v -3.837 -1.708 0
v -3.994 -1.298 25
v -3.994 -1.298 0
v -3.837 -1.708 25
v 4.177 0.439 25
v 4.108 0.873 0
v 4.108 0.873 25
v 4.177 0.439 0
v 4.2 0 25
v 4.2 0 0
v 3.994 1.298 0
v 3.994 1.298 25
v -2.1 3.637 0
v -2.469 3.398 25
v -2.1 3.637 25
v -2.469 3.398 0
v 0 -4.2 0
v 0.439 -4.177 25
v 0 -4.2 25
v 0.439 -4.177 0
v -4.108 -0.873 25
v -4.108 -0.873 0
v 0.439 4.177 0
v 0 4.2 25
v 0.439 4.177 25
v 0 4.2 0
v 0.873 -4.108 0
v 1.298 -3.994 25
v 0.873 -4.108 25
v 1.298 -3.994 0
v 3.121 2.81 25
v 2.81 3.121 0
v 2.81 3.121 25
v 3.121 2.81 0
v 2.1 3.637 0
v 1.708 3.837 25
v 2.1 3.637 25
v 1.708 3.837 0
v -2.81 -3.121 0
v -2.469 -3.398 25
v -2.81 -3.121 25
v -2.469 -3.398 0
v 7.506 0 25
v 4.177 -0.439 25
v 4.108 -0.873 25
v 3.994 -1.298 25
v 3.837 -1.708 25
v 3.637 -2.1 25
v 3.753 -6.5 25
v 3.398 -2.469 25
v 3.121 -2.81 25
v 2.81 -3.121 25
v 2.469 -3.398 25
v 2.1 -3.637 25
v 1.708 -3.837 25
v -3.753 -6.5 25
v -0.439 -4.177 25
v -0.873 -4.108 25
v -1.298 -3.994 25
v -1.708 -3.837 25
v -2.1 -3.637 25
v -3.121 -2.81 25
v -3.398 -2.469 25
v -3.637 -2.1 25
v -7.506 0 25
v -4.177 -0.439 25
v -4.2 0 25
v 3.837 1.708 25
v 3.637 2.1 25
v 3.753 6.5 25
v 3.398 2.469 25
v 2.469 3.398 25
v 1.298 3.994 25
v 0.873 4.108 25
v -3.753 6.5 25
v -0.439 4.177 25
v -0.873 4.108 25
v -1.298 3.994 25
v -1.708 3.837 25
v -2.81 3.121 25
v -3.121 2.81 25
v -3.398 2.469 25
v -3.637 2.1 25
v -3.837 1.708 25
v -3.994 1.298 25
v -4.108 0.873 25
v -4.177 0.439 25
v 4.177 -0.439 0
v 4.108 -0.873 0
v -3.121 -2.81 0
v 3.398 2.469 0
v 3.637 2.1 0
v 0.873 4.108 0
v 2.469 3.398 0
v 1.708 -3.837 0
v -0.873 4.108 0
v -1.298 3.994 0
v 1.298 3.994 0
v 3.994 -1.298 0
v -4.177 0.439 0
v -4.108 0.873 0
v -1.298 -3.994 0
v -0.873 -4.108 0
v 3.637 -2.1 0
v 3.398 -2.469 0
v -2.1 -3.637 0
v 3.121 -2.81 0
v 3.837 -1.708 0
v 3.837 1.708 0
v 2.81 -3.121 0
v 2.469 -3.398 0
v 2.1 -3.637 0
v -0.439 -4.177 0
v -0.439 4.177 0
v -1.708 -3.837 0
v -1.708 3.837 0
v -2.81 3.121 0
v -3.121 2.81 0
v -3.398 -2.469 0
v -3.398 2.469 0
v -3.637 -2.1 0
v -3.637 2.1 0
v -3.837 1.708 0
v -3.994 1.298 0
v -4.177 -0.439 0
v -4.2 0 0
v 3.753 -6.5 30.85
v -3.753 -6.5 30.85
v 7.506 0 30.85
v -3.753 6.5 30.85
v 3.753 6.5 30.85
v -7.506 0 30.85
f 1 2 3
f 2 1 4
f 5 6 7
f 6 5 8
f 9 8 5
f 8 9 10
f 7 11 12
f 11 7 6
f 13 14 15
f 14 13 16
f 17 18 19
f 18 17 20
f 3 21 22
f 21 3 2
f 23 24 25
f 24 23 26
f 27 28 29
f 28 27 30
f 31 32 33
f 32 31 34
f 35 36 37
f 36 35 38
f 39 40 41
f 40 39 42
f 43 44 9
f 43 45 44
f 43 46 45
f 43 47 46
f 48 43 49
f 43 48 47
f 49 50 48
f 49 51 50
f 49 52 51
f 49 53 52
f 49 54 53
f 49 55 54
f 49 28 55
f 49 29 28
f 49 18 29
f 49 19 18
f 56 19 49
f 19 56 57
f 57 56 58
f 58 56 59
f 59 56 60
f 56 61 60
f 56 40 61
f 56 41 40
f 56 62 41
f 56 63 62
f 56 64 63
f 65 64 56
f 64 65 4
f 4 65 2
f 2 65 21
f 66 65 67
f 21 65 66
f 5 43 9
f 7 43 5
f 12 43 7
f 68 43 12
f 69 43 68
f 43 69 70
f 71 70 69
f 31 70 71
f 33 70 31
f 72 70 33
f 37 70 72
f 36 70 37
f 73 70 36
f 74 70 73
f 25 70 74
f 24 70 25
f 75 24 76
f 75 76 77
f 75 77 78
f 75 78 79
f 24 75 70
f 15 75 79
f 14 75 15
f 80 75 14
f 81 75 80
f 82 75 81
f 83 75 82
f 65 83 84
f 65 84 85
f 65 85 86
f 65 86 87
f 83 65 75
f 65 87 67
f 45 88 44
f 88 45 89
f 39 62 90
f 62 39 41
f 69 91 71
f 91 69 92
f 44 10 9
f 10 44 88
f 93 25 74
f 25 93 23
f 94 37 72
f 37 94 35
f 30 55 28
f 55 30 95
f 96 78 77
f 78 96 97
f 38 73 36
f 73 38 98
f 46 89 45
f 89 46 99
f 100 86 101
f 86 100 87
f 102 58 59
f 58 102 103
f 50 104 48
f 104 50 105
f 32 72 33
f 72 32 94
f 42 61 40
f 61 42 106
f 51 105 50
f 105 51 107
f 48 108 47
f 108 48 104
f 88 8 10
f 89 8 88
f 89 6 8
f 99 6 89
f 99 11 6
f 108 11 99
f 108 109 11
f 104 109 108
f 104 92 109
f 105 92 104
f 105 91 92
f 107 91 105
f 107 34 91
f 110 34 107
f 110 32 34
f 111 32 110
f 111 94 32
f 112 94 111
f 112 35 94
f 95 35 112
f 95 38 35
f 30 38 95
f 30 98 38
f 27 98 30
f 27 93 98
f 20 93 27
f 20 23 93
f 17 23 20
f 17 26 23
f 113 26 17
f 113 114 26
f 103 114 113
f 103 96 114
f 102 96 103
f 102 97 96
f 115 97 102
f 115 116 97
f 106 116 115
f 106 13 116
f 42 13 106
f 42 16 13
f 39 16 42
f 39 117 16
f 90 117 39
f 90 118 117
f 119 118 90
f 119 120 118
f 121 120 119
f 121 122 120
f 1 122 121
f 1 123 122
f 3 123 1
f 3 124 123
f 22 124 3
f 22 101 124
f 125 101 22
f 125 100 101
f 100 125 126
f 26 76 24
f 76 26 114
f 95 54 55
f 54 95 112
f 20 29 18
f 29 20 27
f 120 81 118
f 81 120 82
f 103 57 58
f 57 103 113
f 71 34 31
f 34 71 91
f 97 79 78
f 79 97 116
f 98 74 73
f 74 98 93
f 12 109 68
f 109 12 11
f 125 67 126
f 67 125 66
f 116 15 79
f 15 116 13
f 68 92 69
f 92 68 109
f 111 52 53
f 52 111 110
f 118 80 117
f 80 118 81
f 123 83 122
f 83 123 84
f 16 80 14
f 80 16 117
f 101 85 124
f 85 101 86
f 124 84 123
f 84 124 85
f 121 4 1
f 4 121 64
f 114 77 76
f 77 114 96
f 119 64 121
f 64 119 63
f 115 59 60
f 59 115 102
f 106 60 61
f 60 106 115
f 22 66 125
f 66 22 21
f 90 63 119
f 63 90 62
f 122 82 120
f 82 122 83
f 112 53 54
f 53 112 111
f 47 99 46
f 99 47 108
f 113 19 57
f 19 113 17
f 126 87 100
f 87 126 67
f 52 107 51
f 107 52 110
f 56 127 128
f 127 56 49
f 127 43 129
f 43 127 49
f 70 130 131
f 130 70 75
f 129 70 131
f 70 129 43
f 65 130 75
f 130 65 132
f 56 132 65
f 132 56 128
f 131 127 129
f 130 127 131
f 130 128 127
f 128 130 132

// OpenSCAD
// Hex-head bolt.
$fn = 60;
eps = 0.02;
thread_d = 8.4;
flat = 13;
shaft_l = 25;
union() { cylinder(d=thread_d,h=shaft_l); translate([0,0,shaft_l]) cylinder(d=flat/cos(30),h=flat*0.45,$fn=6); }
